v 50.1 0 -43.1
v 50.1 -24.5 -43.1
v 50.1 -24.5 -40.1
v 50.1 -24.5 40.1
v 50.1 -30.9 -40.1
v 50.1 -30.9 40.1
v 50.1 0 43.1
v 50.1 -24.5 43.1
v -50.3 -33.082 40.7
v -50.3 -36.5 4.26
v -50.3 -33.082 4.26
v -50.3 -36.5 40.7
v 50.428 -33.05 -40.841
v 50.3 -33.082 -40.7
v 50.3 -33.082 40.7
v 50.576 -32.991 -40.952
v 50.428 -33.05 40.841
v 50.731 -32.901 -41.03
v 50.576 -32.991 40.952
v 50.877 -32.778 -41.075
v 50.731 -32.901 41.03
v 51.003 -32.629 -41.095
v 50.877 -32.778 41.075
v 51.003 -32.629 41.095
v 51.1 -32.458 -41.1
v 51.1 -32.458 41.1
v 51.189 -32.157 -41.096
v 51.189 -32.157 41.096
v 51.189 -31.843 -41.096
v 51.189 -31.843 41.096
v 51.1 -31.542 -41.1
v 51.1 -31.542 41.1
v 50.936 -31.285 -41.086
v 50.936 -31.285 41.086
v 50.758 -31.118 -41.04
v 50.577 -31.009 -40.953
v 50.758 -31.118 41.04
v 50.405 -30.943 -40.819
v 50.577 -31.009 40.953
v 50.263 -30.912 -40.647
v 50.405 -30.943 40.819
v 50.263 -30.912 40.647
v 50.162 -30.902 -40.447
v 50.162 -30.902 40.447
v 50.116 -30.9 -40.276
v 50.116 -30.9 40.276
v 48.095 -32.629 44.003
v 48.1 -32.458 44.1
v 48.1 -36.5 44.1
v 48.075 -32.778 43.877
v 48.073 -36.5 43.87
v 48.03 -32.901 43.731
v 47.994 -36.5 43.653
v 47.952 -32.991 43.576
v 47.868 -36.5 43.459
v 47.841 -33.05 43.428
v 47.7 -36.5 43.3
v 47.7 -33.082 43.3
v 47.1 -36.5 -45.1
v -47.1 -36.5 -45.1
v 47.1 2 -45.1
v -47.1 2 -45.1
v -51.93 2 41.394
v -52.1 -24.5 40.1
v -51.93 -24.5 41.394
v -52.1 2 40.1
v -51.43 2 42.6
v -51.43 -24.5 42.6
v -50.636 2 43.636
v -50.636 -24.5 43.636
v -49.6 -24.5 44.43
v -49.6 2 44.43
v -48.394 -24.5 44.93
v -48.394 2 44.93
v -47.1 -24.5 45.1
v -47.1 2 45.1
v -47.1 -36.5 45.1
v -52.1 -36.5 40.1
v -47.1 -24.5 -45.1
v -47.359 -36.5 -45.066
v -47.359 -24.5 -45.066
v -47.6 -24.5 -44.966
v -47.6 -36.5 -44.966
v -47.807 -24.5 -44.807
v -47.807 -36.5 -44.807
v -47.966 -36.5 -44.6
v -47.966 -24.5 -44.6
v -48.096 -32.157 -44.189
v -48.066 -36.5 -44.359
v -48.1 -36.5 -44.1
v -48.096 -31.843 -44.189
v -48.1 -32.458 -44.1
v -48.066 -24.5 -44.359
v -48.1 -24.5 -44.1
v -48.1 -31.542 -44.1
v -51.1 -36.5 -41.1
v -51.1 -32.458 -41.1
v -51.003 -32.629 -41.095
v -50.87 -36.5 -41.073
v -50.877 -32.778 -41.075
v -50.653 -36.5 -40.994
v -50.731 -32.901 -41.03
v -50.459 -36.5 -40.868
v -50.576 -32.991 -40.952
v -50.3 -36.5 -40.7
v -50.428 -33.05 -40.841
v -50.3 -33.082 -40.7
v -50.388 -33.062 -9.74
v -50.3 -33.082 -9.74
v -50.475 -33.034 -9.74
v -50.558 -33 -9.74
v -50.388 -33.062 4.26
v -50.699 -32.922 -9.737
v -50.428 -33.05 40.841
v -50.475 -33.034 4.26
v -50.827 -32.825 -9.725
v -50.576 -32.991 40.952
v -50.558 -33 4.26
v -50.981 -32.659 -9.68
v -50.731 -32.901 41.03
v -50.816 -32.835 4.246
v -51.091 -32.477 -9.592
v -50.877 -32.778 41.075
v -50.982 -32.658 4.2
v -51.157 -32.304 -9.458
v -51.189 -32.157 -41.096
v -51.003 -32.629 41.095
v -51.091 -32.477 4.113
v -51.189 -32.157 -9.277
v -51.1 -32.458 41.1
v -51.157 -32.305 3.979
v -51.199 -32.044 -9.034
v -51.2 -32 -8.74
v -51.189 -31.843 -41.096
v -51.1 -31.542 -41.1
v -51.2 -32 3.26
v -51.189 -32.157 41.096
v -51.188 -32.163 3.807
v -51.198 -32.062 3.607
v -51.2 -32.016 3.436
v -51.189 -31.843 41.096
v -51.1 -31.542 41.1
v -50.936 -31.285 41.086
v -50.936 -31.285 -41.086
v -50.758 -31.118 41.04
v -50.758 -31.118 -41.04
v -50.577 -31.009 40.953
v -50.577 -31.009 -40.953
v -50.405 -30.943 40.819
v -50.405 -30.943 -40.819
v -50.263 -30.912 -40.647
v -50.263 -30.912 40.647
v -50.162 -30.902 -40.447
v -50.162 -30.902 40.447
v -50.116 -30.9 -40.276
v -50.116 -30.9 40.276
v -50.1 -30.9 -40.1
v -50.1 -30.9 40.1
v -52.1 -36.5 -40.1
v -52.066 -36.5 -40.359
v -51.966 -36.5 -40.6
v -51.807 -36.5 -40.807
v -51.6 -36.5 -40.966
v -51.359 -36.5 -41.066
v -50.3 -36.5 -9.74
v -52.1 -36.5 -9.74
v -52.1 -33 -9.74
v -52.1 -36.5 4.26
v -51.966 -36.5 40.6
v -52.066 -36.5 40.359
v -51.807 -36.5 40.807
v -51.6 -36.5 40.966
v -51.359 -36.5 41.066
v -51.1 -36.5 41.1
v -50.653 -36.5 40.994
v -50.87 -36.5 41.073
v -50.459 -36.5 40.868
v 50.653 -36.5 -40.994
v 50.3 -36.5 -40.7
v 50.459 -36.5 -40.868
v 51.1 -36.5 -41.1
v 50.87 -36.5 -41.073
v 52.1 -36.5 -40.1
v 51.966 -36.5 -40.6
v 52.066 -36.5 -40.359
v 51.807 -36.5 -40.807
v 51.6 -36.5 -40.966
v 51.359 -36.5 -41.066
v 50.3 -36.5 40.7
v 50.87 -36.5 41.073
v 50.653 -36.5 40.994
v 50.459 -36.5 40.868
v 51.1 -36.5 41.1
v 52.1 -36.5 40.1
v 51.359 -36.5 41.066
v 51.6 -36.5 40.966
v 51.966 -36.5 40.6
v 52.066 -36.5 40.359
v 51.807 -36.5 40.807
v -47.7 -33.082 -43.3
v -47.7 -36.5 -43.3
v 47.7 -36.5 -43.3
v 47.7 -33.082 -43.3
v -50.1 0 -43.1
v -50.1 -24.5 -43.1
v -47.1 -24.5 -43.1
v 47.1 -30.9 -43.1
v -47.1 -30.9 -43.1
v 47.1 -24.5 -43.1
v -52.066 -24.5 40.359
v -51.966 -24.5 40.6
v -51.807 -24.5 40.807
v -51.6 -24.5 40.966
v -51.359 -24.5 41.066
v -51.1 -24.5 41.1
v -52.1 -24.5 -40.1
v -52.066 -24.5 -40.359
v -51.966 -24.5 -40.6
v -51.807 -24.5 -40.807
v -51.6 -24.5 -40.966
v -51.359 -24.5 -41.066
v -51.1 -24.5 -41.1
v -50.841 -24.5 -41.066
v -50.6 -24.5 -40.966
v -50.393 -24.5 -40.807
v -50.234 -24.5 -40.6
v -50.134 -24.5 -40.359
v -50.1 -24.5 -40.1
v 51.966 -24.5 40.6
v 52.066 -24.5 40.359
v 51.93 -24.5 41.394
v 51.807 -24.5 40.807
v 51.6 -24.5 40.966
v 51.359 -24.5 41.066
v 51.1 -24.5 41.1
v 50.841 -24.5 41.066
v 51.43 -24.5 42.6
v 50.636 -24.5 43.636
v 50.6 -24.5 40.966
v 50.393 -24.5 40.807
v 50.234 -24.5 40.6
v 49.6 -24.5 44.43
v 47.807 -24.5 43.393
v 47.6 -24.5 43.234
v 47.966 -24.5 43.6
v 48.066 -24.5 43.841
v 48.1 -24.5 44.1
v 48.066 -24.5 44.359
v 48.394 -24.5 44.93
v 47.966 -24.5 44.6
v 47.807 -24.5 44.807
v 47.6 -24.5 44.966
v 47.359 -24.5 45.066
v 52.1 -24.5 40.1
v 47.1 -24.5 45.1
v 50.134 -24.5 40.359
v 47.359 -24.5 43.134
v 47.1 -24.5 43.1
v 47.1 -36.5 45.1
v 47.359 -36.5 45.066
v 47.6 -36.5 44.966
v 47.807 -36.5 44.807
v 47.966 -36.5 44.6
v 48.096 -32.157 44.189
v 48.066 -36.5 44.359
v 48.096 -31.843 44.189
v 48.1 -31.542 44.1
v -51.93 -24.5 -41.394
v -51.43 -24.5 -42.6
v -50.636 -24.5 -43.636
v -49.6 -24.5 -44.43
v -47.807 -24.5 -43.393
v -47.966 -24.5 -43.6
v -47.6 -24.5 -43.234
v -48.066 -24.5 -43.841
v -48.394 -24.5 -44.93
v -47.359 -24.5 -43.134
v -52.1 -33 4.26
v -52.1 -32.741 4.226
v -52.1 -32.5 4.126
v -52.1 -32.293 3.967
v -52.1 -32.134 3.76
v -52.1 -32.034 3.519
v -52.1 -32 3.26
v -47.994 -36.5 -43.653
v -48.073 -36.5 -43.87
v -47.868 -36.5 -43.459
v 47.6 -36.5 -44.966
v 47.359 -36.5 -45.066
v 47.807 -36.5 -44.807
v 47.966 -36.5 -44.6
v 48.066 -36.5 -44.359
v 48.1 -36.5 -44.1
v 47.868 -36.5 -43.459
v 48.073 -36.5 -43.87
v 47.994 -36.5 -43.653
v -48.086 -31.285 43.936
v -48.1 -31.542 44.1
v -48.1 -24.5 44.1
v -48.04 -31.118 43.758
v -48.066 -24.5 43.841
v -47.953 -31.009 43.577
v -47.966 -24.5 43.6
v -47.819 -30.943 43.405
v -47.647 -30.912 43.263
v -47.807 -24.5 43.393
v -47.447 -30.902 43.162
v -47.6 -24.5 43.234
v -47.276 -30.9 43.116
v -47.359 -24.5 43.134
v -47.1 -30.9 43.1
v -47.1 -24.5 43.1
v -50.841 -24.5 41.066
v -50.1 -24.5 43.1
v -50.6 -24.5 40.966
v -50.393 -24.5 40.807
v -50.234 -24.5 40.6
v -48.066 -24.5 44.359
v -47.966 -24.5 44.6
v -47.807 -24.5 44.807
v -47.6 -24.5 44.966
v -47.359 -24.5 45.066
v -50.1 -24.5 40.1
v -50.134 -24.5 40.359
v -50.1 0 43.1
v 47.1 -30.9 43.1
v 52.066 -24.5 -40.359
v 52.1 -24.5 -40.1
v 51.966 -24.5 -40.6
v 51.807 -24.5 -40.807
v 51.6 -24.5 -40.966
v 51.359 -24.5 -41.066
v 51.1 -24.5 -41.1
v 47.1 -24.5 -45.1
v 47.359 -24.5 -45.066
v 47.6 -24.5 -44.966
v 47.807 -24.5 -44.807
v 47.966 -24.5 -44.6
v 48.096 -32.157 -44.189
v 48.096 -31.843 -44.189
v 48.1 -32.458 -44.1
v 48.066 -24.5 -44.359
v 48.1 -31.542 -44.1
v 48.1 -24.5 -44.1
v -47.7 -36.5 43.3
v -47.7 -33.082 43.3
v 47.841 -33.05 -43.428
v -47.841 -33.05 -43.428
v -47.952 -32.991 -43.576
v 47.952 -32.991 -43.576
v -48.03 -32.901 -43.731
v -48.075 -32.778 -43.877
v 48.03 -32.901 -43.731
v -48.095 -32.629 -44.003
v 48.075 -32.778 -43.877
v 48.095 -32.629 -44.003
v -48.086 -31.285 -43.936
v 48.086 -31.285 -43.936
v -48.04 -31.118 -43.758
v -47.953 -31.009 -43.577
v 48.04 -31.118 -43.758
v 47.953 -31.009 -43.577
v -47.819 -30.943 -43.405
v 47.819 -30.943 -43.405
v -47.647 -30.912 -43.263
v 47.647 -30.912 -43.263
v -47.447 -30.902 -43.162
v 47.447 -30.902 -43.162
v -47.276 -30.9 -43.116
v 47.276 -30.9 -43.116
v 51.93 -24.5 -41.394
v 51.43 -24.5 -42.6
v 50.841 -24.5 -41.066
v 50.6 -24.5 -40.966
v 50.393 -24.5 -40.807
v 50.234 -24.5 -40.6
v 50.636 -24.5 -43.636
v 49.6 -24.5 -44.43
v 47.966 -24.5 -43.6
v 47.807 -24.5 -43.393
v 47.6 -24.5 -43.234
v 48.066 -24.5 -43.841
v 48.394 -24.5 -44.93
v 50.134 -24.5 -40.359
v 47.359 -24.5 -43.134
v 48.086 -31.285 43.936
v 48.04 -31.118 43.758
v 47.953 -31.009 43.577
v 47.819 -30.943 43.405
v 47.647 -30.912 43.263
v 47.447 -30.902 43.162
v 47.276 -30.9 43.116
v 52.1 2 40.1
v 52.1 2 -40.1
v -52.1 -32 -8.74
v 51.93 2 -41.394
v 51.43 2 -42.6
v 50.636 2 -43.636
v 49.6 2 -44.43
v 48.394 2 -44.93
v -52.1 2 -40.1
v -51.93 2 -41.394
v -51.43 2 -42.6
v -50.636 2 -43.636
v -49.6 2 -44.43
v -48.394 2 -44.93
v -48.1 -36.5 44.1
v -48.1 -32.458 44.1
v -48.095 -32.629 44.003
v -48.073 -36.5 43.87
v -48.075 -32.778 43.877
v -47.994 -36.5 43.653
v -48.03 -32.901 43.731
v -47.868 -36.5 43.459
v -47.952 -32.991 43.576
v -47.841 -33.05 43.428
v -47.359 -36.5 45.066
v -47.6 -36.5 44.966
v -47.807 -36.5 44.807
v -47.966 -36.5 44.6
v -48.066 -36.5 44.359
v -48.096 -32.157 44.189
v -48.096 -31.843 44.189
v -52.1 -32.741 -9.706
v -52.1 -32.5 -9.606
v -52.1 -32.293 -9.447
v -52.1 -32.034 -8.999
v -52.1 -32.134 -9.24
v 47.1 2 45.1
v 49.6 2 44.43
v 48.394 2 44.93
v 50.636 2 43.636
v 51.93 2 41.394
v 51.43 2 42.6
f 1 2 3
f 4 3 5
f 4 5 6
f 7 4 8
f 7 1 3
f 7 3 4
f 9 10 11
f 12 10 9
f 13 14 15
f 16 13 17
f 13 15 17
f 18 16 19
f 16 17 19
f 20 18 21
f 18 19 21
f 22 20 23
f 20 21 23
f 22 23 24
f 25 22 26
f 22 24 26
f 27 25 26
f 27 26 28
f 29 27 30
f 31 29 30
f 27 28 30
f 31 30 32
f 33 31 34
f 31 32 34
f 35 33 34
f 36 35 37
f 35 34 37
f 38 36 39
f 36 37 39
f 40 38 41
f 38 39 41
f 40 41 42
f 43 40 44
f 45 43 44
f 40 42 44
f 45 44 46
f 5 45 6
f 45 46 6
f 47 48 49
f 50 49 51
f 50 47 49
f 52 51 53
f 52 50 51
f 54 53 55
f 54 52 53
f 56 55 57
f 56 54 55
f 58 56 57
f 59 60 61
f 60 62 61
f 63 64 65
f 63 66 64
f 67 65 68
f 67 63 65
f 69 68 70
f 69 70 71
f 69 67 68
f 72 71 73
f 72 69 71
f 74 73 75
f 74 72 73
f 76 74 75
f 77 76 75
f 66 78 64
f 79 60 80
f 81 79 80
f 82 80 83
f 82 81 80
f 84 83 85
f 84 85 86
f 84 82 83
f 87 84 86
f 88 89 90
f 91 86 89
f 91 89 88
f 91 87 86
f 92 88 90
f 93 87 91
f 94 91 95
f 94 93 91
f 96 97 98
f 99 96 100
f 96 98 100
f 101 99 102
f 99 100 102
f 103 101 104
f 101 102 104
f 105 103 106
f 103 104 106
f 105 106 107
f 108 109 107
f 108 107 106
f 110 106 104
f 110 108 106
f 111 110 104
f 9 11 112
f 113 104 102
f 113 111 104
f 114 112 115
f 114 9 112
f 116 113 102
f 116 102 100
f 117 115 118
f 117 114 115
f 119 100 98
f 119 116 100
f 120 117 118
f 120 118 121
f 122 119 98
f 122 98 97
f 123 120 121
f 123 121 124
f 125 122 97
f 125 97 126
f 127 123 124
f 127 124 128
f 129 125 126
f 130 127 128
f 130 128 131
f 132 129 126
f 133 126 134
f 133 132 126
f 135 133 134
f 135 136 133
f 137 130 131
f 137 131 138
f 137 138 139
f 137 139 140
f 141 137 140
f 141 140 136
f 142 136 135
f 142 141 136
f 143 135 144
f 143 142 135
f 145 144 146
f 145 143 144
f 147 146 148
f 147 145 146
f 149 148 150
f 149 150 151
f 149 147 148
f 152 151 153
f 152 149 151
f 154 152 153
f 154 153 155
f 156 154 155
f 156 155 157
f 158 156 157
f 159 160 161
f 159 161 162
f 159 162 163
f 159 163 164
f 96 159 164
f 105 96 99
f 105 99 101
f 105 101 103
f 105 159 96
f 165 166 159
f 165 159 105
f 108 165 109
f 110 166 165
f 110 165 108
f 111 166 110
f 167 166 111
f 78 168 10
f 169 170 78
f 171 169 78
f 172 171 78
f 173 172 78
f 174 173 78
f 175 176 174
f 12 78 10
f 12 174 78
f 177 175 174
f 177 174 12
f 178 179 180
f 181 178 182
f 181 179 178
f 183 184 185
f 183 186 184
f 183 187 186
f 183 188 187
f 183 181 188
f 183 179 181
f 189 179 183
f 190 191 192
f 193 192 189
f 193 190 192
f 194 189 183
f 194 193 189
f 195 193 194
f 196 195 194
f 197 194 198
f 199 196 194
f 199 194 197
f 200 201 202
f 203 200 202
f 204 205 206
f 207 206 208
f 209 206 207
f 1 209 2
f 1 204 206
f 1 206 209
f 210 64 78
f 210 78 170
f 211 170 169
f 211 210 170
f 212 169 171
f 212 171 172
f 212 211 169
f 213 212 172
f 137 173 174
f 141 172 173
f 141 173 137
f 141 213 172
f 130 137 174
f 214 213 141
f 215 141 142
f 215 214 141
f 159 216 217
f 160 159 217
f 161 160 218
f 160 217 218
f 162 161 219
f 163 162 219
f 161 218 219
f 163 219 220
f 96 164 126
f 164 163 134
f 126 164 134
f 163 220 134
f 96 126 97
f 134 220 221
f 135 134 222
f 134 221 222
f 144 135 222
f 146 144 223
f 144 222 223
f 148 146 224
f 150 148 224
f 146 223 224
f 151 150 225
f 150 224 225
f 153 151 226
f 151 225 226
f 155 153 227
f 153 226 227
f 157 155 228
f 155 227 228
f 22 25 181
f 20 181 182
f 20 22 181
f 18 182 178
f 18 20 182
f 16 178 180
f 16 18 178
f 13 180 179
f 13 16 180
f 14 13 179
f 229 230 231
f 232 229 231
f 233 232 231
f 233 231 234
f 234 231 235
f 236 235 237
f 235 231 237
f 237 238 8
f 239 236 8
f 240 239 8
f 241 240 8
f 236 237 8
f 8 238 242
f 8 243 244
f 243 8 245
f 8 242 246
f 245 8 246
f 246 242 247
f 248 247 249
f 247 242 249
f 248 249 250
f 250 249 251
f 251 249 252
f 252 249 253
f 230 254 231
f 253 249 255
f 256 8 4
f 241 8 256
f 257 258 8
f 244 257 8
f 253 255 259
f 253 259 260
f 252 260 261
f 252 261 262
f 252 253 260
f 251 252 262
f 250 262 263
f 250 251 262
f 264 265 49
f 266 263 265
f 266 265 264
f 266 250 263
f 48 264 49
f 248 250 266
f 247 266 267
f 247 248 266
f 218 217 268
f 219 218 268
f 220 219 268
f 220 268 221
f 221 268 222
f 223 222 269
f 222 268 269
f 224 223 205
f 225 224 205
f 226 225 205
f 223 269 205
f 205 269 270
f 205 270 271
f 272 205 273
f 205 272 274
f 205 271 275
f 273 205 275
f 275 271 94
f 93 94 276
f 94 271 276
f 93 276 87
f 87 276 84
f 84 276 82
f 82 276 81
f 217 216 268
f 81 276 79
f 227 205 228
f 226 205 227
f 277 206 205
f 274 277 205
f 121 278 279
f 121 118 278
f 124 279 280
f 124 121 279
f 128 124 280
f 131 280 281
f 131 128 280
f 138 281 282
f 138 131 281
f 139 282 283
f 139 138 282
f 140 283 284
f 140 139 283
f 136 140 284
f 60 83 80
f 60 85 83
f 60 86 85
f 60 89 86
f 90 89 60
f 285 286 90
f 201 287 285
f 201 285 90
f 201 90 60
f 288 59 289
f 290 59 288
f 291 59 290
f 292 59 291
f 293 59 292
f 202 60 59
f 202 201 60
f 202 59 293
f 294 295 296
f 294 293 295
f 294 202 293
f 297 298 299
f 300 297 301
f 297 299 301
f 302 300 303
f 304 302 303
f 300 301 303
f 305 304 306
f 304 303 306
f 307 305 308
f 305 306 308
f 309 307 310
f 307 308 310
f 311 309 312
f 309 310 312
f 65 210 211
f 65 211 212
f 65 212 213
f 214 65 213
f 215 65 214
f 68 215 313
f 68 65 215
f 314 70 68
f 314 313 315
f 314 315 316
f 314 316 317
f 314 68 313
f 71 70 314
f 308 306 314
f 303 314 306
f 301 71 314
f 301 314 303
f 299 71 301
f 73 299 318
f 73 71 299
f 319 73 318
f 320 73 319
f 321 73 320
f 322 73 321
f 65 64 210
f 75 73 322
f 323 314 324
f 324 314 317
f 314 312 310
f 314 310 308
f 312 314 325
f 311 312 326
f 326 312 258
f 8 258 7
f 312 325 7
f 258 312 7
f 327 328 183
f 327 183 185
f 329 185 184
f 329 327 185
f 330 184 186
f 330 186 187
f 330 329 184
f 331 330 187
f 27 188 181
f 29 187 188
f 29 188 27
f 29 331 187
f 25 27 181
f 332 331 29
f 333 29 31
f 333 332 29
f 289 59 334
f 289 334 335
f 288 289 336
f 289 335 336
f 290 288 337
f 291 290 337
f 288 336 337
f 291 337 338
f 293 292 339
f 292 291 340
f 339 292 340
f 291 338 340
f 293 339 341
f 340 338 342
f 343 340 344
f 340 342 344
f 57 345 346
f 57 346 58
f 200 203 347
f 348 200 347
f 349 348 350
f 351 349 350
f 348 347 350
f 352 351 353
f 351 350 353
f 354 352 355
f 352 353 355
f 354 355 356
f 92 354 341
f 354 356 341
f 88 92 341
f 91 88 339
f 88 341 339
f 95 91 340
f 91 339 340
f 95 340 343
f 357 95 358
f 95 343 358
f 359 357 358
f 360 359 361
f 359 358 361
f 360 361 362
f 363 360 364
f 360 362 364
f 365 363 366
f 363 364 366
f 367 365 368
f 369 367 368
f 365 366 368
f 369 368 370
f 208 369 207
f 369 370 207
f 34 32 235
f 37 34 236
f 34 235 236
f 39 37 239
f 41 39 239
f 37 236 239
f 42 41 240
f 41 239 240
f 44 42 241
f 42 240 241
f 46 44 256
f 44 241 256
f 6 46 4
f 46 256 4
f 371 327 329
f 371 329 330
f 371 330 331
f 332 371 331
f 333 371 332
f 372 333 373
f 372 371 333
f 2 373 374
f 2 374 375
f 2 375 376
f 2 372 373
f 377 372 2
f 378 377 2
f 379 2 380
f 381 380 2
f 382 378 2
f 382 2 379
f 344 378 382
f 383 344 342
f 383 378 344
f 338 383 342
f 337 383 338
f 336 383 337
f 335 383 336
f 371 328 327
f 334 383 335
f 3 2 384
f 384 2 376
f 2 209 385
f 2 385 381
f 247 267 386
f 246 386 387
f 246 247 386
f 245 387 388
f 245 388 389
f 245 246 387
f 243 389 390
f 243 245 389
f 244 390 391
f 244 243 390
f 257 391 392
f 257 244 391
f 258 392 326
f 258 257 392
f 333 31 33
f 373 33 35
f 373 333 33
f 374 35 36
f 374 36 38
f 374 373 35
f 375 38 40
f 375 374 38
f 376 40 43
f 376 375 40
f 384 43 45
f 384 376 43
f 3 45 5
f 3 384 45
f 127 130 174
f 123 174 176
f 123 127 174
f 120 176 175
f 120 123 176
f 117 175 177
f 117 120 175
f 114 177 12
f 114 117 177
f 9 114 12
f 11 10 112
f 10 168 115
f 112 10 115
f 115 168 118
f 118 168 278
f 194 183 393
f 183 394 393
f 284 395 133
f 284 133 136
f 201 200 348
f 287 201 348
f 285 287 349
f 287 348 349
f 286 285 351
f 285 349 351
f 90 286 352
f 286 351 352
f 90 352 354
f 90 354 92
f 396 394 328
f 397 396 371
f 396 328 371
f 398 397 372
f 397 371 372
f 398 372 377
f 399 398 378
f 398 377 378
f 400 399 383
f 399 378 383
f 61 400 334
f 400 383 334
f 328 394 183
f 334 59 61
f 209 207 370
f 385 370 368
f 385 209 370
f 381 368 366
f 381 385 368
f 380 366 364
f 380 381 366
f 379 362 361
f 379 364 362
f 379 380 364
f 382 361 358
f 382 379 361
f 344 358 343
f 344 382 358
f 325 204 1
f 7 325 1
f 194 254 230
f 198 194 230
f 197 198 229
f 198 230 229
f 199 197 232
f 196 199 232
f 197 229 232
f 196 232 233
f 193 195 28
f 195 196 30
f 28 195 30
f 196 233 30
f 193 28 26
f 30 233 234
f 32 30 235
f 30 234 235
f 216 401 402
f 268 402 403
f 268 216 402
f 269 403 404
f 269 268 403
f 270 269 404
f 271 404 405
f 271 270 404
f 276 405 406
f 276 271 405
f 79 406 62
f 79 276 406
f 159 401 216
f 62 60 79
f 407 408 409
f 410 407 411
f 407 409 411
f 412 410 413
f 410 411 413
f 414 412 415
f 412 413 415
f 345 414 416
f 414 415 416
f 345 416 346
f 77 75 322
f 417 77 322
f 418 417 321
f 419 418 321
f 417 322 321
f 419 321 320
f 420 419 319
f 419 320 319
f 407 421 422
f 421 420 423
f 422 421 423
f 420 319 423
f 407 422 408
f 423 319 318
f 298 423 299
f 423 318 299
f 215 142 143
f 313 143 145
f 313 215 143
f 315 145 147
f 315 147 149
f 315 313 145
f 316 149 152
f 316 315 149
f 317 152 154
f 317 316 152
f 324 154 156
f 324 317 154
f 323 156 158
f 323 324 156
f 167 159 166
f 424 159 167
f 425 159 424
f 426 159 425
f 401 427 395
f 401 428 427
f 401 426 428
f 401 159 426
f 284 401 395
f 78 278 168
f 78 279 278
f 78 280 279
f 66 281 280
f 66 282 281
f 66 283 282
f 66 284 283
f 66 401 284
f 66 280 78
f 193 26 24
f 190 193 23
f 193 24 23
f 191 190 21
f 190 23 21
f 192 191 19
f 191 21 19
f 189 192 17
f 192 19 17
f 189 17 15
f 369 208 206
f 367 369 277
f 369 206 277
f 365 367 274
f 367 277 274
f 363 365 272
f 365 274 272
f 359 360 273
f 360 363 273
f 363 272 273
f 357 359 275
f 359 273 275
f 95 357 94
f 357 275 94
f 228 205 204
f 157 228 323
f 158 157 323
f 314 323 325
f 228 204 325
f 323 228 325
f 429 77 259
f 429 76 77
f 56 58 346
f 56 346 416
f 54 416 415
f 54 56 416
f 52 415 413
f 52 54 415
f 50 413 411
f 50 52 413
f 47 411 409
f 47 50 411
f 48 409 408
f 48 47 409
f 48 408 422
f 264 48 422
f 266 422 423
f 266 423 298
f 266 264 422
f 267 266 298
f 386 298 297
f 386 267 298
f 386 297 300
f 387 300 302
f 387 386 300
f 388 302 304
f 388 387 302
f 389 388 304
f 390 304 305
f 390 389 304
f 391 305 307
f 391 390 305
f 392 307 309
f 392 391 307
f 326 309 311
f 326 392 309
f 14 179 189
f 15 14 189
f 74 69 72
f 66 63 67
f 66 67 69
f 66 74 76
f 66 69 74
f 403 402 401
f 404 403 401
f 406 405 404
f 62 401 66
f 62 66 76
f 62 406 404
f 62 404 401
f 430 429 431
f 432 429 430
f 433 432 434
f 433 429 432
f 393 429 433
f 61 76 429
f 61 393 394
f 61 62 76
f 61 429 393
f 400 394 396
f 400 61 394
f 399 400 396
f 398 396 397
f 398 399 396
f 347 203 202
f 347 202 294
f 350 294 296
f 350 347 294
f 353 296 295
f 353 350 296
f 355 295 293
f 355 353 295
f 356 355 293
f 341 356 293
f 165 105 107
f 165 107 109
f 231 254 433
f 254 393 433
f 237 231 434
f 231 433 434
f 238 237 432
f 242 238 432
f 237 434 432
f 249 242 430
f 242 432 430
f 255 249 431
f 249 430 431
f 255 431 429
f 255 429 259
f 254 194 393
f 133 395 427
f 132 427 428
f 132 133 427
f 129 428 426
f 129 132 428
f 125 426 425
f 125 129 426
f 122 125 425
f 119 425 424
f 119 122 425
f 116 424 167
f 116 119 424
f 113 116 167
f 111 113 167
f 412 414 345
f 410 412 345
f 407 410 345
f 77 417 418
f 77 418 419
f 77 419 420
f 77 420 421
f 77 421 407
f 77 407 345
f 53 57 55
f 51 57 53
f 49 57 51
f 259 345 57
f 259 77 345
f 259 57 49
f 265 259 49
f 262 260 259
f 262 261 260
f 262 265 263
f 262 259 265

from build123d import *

# Parameters (mm, degrees)
ESQUISSE1_W              = 104.2
ESQUISSE1_H              = 90.2
BOSS_EXTRU_1_DEPTH       = 2
ESQUISSE2_W              = 104.2
ESQUISSE2_H              = 90.2
ESQUISSE2_W_2            = 100.2
ESQUISSE2_H_2            = 86.2
BOSS_EXTRU_2_DEPTH       = 36.5
ENL_V_MAT_EXTRU_1_DEPTH  = 12
SYM_TRIE2_COPY_1_DEPTH   = 12
CONG_3_R                 = 1
CONG_1_R                 = 5
ENL_V_MAT_EXTRU_2_DEPTH  = 78.978650924
ENL_V_MAT_EXTRU_3_DEPTH  = 78.978651027
ESQUISSE15_W             = 100.6
ESQUISSE15_H             = 86.6
ENL_V_MAT_EXTRU_10_DEPTH = 4.5
ENL_V_MAT_EXTRU_11_REACH = 121.264
ESQUISSE17_W             = 14
ESQUISSE17_H             = 9
CONG_4_R                 = 1


with BuildPart() as part:
    # Esquisse1 → Boss.-Extru.1 (new body)
    with BuildSketch(Plane(origin=(0, 0, 0), x_dir=(1, 0, 0), z_dir=(0, 1, 0))):
        Rectangle(ESQUISSE1_W, ESQUISSE1_H)
    extrude(amount=BOSS_EXTRU_1_DEPTH)

    # Esquisse2 → Boss.-Extru.2 (add)
    with BuildSketch(Plane.XZ):
        Rectangle(ESQUISSE2_W, ESQUISSE2_H)
        Rectangle(ESQUISSE2_W_2, ESQUISSE2_H_2, mode=Mode.SUBTRACT)
    extrude(amount=BOSS_EXTRU_2_DEPTH)

    # Esquisse3 → Enlèv. mat.-Extru.1 (cut)
    with BuildSketch(Plane.XZ.offset(36.5)):
        Polygon((-50.1, 41.1), (-50.1, 43.1), (-48.1, 43.1), (-48.1, 45.1), (-52.1, 45.1), (-52.1, 41.1), align=None)
    enl_v_mat_extru_1 = extrude(amount=-ENL_V_MAT_EXTRU_1_DEPTH, mode=Mode.SUBTRACT)

    # Symétrie1: Enlèv. mat.-Extru.1 across plane
    add(enl_v_mat_extru_1.mirror(Plane.XY), mode=Mode.SUBTRACT)

    # Symétrie2: Enlèv. mat.-Extru.1 across plane
    add(enl_v_mat_extru_1.mirror(Plane(origin=(0, 0, 0), x_dir=(0, 0, 1), z_dir=(1, 0, 0))), mode=Mode.SUBTRACT)

    # Symétrie2 copy 1 sketch → Symétrie2 copy 1 (cut)
    with BuildSketch(Plane(origin=(0, -36.5, 0), x_dir=(-1, 0, 0), z_dir=(0, -1, 0))):
        Polygon((-50.1, 41.1), (-50.1, 43.1), (-48.1, 43.1), (-48.1, 45.1), (-52.1, 45.1), (-52.1, 41.1), align=None)
    extrude(amount=-SYM_TRIE2_COPY_1_DEPTH, mode=Mode.SUBTRACT)

    # Congé3
    cong_3_edges = [part.edges().sort_by_distance(p)[0] for p in [
        (-48.1, -30.5, 45.1),
        (-48.1, -30.5, 43.1),
        (-50.1, -30.5, 41.1),
        (-52.1, -30.5, 41.1),
        (48.1, -30.5, 45.1),
        (48.1, -30.5, 43.1),
        (52.1, -30.5, 41.1),
        (50.1, -30.5, 41.1),
        (52.1, -30.5, -41.1),
        (50.1, -30.5, -41.1),
        (48.1, -30.5, -43.1),
        (48.1, -30.5, -45.1),
        (-48.1, -30.5, -45.1),
        (-48.1, -30.5, -43.1),
        (-50.1, -30.5, -41.1),
        (-52.1, -30.5, -41.1),
    ]]
    fillet(cong_3_edges, radius=CONG_3_R - 0.0001)  # a hair under: the kernel refuses the full size

    # Congé1
    cong_1_edges = [part.edges().sort_by_distance(p)[0] for p in [
        (52.1, -11.25, 45.1),
        (52.1, -11.25, -45.1),
        (-52.1, -11.25, -45.1),
        (-52.1, -11.25, 45.1),
    ]]
    fillet(cong_1_edges, radius=CONG_1_R)

    # Esquisse4 → Enlèv. mat.-Extru.2 (cut, symmetric)
    with BuildSketch(Plane(origin=(0, 0, 0), x_dir=(0, 0, -1), z_dir=(1, 0, 0))):
        with BuildLine():
            Line((-43.1, -30.9), (-43.1, -33.1))
            ThreePointArc((-43.1, -33.1), (-44.2, -32), (-43.1, -30.9))
        make_face()
    enl_v_mat_extru_2 = extrude(amount=ENL_V_MAT_EXTRU_2_DEPTH, both=True, mode=Mode.SUBTRACT)

    # Symétrie4: Enlèv. mat.-Extru.2 across plane
    add(enl_v_mat_extru_2.mirror(Plane.XY), mode=Mode.SUBTRACT)

    # Esquisse5 → Enlèv. mat.-Extru.3 (cut, symmetric)
    with BuildSketch(Plane.XY):
        with BuildLine():
            Line((-50.1, -30.9), (-50.1, -33.1))
            ThreePointArc((-50.1, -33.1), (-51.2, -32), (-50.1, -30.9))
        make_face()
    enl_v_mat_extru_3 = extrude(amount=ENL_V_MAT_EXTRU_3_DEPTH, both=True, mode=Mode.SUBTRACT)

    # Symétrie5: Enlèv. mat.-Extru.3 across plane
    add(enl_v_mat_extru_3.mirror(Plane(origin=(0, 0, 0), x_dir=(0, 0, 1), z_dir=(1, 0, 0))), mode=Mode.SUBTRACT)

    # Esquisse15 → Enlèv. mat.-Extru.10 (cut)
    with BuildSketch(Plane.XZ.offset(36.5)):
        Rectangle(ESQUISSE15_W, ESQUISSE15_H)
    extrude(amount=-ENL_V_MAT_EXTRU_10_DEPTH, mode=Mode.SUBTRACT)

    # Enlèv. mat.-Extru.11: up to this face of the body (flat: up to its plane)
    enl_v_mat_extru_11_end = Plane(part.part.faces().sort_by_distance((-50.1, -15.270818347, 0))[0])
    # Esquisse17 → Enlèv. mat.-Extru.11 (cut, up to the picked face)
    with BuildSketch(Plane.ZY.offset(52.1), mode=Mode.PRIVATE) as enl_v_mat_extru_11_sk1:
        with Locations((-2.74, -36.5)):
            Rectangle(ESQUISSE17_W, ESQUISSE17_H)
    enl_v_mat_extru_11_tool1 = split(extrude(enl_v_mat_extru_11_sk1.sketch, amount=-ENL_V_MAT_EXTRU_11_REACH, mode=Mode.PRIVATE), bisect_by=enl_v_mat_extru_11_end, keep=Keep.BOTH, mode=Mode.PRIVATE)
    add(enl_v_mat_extru_11_tool1.solids().sort_by(Axis((-52.1, -36.5, -2.74), (1, 0, 0)))[0], mode=Mode.SUBTRACT)

    # Congé4
    cong_4_edges = [part.edges().sort_by_distance(p)[0] for p in [
        (-51.65, -32, -9.74),
        (-51.65, -32, 4.26),
    ]]
    fillet(cong_4_edges, radius=CONG_4_R)


solid = part.part
